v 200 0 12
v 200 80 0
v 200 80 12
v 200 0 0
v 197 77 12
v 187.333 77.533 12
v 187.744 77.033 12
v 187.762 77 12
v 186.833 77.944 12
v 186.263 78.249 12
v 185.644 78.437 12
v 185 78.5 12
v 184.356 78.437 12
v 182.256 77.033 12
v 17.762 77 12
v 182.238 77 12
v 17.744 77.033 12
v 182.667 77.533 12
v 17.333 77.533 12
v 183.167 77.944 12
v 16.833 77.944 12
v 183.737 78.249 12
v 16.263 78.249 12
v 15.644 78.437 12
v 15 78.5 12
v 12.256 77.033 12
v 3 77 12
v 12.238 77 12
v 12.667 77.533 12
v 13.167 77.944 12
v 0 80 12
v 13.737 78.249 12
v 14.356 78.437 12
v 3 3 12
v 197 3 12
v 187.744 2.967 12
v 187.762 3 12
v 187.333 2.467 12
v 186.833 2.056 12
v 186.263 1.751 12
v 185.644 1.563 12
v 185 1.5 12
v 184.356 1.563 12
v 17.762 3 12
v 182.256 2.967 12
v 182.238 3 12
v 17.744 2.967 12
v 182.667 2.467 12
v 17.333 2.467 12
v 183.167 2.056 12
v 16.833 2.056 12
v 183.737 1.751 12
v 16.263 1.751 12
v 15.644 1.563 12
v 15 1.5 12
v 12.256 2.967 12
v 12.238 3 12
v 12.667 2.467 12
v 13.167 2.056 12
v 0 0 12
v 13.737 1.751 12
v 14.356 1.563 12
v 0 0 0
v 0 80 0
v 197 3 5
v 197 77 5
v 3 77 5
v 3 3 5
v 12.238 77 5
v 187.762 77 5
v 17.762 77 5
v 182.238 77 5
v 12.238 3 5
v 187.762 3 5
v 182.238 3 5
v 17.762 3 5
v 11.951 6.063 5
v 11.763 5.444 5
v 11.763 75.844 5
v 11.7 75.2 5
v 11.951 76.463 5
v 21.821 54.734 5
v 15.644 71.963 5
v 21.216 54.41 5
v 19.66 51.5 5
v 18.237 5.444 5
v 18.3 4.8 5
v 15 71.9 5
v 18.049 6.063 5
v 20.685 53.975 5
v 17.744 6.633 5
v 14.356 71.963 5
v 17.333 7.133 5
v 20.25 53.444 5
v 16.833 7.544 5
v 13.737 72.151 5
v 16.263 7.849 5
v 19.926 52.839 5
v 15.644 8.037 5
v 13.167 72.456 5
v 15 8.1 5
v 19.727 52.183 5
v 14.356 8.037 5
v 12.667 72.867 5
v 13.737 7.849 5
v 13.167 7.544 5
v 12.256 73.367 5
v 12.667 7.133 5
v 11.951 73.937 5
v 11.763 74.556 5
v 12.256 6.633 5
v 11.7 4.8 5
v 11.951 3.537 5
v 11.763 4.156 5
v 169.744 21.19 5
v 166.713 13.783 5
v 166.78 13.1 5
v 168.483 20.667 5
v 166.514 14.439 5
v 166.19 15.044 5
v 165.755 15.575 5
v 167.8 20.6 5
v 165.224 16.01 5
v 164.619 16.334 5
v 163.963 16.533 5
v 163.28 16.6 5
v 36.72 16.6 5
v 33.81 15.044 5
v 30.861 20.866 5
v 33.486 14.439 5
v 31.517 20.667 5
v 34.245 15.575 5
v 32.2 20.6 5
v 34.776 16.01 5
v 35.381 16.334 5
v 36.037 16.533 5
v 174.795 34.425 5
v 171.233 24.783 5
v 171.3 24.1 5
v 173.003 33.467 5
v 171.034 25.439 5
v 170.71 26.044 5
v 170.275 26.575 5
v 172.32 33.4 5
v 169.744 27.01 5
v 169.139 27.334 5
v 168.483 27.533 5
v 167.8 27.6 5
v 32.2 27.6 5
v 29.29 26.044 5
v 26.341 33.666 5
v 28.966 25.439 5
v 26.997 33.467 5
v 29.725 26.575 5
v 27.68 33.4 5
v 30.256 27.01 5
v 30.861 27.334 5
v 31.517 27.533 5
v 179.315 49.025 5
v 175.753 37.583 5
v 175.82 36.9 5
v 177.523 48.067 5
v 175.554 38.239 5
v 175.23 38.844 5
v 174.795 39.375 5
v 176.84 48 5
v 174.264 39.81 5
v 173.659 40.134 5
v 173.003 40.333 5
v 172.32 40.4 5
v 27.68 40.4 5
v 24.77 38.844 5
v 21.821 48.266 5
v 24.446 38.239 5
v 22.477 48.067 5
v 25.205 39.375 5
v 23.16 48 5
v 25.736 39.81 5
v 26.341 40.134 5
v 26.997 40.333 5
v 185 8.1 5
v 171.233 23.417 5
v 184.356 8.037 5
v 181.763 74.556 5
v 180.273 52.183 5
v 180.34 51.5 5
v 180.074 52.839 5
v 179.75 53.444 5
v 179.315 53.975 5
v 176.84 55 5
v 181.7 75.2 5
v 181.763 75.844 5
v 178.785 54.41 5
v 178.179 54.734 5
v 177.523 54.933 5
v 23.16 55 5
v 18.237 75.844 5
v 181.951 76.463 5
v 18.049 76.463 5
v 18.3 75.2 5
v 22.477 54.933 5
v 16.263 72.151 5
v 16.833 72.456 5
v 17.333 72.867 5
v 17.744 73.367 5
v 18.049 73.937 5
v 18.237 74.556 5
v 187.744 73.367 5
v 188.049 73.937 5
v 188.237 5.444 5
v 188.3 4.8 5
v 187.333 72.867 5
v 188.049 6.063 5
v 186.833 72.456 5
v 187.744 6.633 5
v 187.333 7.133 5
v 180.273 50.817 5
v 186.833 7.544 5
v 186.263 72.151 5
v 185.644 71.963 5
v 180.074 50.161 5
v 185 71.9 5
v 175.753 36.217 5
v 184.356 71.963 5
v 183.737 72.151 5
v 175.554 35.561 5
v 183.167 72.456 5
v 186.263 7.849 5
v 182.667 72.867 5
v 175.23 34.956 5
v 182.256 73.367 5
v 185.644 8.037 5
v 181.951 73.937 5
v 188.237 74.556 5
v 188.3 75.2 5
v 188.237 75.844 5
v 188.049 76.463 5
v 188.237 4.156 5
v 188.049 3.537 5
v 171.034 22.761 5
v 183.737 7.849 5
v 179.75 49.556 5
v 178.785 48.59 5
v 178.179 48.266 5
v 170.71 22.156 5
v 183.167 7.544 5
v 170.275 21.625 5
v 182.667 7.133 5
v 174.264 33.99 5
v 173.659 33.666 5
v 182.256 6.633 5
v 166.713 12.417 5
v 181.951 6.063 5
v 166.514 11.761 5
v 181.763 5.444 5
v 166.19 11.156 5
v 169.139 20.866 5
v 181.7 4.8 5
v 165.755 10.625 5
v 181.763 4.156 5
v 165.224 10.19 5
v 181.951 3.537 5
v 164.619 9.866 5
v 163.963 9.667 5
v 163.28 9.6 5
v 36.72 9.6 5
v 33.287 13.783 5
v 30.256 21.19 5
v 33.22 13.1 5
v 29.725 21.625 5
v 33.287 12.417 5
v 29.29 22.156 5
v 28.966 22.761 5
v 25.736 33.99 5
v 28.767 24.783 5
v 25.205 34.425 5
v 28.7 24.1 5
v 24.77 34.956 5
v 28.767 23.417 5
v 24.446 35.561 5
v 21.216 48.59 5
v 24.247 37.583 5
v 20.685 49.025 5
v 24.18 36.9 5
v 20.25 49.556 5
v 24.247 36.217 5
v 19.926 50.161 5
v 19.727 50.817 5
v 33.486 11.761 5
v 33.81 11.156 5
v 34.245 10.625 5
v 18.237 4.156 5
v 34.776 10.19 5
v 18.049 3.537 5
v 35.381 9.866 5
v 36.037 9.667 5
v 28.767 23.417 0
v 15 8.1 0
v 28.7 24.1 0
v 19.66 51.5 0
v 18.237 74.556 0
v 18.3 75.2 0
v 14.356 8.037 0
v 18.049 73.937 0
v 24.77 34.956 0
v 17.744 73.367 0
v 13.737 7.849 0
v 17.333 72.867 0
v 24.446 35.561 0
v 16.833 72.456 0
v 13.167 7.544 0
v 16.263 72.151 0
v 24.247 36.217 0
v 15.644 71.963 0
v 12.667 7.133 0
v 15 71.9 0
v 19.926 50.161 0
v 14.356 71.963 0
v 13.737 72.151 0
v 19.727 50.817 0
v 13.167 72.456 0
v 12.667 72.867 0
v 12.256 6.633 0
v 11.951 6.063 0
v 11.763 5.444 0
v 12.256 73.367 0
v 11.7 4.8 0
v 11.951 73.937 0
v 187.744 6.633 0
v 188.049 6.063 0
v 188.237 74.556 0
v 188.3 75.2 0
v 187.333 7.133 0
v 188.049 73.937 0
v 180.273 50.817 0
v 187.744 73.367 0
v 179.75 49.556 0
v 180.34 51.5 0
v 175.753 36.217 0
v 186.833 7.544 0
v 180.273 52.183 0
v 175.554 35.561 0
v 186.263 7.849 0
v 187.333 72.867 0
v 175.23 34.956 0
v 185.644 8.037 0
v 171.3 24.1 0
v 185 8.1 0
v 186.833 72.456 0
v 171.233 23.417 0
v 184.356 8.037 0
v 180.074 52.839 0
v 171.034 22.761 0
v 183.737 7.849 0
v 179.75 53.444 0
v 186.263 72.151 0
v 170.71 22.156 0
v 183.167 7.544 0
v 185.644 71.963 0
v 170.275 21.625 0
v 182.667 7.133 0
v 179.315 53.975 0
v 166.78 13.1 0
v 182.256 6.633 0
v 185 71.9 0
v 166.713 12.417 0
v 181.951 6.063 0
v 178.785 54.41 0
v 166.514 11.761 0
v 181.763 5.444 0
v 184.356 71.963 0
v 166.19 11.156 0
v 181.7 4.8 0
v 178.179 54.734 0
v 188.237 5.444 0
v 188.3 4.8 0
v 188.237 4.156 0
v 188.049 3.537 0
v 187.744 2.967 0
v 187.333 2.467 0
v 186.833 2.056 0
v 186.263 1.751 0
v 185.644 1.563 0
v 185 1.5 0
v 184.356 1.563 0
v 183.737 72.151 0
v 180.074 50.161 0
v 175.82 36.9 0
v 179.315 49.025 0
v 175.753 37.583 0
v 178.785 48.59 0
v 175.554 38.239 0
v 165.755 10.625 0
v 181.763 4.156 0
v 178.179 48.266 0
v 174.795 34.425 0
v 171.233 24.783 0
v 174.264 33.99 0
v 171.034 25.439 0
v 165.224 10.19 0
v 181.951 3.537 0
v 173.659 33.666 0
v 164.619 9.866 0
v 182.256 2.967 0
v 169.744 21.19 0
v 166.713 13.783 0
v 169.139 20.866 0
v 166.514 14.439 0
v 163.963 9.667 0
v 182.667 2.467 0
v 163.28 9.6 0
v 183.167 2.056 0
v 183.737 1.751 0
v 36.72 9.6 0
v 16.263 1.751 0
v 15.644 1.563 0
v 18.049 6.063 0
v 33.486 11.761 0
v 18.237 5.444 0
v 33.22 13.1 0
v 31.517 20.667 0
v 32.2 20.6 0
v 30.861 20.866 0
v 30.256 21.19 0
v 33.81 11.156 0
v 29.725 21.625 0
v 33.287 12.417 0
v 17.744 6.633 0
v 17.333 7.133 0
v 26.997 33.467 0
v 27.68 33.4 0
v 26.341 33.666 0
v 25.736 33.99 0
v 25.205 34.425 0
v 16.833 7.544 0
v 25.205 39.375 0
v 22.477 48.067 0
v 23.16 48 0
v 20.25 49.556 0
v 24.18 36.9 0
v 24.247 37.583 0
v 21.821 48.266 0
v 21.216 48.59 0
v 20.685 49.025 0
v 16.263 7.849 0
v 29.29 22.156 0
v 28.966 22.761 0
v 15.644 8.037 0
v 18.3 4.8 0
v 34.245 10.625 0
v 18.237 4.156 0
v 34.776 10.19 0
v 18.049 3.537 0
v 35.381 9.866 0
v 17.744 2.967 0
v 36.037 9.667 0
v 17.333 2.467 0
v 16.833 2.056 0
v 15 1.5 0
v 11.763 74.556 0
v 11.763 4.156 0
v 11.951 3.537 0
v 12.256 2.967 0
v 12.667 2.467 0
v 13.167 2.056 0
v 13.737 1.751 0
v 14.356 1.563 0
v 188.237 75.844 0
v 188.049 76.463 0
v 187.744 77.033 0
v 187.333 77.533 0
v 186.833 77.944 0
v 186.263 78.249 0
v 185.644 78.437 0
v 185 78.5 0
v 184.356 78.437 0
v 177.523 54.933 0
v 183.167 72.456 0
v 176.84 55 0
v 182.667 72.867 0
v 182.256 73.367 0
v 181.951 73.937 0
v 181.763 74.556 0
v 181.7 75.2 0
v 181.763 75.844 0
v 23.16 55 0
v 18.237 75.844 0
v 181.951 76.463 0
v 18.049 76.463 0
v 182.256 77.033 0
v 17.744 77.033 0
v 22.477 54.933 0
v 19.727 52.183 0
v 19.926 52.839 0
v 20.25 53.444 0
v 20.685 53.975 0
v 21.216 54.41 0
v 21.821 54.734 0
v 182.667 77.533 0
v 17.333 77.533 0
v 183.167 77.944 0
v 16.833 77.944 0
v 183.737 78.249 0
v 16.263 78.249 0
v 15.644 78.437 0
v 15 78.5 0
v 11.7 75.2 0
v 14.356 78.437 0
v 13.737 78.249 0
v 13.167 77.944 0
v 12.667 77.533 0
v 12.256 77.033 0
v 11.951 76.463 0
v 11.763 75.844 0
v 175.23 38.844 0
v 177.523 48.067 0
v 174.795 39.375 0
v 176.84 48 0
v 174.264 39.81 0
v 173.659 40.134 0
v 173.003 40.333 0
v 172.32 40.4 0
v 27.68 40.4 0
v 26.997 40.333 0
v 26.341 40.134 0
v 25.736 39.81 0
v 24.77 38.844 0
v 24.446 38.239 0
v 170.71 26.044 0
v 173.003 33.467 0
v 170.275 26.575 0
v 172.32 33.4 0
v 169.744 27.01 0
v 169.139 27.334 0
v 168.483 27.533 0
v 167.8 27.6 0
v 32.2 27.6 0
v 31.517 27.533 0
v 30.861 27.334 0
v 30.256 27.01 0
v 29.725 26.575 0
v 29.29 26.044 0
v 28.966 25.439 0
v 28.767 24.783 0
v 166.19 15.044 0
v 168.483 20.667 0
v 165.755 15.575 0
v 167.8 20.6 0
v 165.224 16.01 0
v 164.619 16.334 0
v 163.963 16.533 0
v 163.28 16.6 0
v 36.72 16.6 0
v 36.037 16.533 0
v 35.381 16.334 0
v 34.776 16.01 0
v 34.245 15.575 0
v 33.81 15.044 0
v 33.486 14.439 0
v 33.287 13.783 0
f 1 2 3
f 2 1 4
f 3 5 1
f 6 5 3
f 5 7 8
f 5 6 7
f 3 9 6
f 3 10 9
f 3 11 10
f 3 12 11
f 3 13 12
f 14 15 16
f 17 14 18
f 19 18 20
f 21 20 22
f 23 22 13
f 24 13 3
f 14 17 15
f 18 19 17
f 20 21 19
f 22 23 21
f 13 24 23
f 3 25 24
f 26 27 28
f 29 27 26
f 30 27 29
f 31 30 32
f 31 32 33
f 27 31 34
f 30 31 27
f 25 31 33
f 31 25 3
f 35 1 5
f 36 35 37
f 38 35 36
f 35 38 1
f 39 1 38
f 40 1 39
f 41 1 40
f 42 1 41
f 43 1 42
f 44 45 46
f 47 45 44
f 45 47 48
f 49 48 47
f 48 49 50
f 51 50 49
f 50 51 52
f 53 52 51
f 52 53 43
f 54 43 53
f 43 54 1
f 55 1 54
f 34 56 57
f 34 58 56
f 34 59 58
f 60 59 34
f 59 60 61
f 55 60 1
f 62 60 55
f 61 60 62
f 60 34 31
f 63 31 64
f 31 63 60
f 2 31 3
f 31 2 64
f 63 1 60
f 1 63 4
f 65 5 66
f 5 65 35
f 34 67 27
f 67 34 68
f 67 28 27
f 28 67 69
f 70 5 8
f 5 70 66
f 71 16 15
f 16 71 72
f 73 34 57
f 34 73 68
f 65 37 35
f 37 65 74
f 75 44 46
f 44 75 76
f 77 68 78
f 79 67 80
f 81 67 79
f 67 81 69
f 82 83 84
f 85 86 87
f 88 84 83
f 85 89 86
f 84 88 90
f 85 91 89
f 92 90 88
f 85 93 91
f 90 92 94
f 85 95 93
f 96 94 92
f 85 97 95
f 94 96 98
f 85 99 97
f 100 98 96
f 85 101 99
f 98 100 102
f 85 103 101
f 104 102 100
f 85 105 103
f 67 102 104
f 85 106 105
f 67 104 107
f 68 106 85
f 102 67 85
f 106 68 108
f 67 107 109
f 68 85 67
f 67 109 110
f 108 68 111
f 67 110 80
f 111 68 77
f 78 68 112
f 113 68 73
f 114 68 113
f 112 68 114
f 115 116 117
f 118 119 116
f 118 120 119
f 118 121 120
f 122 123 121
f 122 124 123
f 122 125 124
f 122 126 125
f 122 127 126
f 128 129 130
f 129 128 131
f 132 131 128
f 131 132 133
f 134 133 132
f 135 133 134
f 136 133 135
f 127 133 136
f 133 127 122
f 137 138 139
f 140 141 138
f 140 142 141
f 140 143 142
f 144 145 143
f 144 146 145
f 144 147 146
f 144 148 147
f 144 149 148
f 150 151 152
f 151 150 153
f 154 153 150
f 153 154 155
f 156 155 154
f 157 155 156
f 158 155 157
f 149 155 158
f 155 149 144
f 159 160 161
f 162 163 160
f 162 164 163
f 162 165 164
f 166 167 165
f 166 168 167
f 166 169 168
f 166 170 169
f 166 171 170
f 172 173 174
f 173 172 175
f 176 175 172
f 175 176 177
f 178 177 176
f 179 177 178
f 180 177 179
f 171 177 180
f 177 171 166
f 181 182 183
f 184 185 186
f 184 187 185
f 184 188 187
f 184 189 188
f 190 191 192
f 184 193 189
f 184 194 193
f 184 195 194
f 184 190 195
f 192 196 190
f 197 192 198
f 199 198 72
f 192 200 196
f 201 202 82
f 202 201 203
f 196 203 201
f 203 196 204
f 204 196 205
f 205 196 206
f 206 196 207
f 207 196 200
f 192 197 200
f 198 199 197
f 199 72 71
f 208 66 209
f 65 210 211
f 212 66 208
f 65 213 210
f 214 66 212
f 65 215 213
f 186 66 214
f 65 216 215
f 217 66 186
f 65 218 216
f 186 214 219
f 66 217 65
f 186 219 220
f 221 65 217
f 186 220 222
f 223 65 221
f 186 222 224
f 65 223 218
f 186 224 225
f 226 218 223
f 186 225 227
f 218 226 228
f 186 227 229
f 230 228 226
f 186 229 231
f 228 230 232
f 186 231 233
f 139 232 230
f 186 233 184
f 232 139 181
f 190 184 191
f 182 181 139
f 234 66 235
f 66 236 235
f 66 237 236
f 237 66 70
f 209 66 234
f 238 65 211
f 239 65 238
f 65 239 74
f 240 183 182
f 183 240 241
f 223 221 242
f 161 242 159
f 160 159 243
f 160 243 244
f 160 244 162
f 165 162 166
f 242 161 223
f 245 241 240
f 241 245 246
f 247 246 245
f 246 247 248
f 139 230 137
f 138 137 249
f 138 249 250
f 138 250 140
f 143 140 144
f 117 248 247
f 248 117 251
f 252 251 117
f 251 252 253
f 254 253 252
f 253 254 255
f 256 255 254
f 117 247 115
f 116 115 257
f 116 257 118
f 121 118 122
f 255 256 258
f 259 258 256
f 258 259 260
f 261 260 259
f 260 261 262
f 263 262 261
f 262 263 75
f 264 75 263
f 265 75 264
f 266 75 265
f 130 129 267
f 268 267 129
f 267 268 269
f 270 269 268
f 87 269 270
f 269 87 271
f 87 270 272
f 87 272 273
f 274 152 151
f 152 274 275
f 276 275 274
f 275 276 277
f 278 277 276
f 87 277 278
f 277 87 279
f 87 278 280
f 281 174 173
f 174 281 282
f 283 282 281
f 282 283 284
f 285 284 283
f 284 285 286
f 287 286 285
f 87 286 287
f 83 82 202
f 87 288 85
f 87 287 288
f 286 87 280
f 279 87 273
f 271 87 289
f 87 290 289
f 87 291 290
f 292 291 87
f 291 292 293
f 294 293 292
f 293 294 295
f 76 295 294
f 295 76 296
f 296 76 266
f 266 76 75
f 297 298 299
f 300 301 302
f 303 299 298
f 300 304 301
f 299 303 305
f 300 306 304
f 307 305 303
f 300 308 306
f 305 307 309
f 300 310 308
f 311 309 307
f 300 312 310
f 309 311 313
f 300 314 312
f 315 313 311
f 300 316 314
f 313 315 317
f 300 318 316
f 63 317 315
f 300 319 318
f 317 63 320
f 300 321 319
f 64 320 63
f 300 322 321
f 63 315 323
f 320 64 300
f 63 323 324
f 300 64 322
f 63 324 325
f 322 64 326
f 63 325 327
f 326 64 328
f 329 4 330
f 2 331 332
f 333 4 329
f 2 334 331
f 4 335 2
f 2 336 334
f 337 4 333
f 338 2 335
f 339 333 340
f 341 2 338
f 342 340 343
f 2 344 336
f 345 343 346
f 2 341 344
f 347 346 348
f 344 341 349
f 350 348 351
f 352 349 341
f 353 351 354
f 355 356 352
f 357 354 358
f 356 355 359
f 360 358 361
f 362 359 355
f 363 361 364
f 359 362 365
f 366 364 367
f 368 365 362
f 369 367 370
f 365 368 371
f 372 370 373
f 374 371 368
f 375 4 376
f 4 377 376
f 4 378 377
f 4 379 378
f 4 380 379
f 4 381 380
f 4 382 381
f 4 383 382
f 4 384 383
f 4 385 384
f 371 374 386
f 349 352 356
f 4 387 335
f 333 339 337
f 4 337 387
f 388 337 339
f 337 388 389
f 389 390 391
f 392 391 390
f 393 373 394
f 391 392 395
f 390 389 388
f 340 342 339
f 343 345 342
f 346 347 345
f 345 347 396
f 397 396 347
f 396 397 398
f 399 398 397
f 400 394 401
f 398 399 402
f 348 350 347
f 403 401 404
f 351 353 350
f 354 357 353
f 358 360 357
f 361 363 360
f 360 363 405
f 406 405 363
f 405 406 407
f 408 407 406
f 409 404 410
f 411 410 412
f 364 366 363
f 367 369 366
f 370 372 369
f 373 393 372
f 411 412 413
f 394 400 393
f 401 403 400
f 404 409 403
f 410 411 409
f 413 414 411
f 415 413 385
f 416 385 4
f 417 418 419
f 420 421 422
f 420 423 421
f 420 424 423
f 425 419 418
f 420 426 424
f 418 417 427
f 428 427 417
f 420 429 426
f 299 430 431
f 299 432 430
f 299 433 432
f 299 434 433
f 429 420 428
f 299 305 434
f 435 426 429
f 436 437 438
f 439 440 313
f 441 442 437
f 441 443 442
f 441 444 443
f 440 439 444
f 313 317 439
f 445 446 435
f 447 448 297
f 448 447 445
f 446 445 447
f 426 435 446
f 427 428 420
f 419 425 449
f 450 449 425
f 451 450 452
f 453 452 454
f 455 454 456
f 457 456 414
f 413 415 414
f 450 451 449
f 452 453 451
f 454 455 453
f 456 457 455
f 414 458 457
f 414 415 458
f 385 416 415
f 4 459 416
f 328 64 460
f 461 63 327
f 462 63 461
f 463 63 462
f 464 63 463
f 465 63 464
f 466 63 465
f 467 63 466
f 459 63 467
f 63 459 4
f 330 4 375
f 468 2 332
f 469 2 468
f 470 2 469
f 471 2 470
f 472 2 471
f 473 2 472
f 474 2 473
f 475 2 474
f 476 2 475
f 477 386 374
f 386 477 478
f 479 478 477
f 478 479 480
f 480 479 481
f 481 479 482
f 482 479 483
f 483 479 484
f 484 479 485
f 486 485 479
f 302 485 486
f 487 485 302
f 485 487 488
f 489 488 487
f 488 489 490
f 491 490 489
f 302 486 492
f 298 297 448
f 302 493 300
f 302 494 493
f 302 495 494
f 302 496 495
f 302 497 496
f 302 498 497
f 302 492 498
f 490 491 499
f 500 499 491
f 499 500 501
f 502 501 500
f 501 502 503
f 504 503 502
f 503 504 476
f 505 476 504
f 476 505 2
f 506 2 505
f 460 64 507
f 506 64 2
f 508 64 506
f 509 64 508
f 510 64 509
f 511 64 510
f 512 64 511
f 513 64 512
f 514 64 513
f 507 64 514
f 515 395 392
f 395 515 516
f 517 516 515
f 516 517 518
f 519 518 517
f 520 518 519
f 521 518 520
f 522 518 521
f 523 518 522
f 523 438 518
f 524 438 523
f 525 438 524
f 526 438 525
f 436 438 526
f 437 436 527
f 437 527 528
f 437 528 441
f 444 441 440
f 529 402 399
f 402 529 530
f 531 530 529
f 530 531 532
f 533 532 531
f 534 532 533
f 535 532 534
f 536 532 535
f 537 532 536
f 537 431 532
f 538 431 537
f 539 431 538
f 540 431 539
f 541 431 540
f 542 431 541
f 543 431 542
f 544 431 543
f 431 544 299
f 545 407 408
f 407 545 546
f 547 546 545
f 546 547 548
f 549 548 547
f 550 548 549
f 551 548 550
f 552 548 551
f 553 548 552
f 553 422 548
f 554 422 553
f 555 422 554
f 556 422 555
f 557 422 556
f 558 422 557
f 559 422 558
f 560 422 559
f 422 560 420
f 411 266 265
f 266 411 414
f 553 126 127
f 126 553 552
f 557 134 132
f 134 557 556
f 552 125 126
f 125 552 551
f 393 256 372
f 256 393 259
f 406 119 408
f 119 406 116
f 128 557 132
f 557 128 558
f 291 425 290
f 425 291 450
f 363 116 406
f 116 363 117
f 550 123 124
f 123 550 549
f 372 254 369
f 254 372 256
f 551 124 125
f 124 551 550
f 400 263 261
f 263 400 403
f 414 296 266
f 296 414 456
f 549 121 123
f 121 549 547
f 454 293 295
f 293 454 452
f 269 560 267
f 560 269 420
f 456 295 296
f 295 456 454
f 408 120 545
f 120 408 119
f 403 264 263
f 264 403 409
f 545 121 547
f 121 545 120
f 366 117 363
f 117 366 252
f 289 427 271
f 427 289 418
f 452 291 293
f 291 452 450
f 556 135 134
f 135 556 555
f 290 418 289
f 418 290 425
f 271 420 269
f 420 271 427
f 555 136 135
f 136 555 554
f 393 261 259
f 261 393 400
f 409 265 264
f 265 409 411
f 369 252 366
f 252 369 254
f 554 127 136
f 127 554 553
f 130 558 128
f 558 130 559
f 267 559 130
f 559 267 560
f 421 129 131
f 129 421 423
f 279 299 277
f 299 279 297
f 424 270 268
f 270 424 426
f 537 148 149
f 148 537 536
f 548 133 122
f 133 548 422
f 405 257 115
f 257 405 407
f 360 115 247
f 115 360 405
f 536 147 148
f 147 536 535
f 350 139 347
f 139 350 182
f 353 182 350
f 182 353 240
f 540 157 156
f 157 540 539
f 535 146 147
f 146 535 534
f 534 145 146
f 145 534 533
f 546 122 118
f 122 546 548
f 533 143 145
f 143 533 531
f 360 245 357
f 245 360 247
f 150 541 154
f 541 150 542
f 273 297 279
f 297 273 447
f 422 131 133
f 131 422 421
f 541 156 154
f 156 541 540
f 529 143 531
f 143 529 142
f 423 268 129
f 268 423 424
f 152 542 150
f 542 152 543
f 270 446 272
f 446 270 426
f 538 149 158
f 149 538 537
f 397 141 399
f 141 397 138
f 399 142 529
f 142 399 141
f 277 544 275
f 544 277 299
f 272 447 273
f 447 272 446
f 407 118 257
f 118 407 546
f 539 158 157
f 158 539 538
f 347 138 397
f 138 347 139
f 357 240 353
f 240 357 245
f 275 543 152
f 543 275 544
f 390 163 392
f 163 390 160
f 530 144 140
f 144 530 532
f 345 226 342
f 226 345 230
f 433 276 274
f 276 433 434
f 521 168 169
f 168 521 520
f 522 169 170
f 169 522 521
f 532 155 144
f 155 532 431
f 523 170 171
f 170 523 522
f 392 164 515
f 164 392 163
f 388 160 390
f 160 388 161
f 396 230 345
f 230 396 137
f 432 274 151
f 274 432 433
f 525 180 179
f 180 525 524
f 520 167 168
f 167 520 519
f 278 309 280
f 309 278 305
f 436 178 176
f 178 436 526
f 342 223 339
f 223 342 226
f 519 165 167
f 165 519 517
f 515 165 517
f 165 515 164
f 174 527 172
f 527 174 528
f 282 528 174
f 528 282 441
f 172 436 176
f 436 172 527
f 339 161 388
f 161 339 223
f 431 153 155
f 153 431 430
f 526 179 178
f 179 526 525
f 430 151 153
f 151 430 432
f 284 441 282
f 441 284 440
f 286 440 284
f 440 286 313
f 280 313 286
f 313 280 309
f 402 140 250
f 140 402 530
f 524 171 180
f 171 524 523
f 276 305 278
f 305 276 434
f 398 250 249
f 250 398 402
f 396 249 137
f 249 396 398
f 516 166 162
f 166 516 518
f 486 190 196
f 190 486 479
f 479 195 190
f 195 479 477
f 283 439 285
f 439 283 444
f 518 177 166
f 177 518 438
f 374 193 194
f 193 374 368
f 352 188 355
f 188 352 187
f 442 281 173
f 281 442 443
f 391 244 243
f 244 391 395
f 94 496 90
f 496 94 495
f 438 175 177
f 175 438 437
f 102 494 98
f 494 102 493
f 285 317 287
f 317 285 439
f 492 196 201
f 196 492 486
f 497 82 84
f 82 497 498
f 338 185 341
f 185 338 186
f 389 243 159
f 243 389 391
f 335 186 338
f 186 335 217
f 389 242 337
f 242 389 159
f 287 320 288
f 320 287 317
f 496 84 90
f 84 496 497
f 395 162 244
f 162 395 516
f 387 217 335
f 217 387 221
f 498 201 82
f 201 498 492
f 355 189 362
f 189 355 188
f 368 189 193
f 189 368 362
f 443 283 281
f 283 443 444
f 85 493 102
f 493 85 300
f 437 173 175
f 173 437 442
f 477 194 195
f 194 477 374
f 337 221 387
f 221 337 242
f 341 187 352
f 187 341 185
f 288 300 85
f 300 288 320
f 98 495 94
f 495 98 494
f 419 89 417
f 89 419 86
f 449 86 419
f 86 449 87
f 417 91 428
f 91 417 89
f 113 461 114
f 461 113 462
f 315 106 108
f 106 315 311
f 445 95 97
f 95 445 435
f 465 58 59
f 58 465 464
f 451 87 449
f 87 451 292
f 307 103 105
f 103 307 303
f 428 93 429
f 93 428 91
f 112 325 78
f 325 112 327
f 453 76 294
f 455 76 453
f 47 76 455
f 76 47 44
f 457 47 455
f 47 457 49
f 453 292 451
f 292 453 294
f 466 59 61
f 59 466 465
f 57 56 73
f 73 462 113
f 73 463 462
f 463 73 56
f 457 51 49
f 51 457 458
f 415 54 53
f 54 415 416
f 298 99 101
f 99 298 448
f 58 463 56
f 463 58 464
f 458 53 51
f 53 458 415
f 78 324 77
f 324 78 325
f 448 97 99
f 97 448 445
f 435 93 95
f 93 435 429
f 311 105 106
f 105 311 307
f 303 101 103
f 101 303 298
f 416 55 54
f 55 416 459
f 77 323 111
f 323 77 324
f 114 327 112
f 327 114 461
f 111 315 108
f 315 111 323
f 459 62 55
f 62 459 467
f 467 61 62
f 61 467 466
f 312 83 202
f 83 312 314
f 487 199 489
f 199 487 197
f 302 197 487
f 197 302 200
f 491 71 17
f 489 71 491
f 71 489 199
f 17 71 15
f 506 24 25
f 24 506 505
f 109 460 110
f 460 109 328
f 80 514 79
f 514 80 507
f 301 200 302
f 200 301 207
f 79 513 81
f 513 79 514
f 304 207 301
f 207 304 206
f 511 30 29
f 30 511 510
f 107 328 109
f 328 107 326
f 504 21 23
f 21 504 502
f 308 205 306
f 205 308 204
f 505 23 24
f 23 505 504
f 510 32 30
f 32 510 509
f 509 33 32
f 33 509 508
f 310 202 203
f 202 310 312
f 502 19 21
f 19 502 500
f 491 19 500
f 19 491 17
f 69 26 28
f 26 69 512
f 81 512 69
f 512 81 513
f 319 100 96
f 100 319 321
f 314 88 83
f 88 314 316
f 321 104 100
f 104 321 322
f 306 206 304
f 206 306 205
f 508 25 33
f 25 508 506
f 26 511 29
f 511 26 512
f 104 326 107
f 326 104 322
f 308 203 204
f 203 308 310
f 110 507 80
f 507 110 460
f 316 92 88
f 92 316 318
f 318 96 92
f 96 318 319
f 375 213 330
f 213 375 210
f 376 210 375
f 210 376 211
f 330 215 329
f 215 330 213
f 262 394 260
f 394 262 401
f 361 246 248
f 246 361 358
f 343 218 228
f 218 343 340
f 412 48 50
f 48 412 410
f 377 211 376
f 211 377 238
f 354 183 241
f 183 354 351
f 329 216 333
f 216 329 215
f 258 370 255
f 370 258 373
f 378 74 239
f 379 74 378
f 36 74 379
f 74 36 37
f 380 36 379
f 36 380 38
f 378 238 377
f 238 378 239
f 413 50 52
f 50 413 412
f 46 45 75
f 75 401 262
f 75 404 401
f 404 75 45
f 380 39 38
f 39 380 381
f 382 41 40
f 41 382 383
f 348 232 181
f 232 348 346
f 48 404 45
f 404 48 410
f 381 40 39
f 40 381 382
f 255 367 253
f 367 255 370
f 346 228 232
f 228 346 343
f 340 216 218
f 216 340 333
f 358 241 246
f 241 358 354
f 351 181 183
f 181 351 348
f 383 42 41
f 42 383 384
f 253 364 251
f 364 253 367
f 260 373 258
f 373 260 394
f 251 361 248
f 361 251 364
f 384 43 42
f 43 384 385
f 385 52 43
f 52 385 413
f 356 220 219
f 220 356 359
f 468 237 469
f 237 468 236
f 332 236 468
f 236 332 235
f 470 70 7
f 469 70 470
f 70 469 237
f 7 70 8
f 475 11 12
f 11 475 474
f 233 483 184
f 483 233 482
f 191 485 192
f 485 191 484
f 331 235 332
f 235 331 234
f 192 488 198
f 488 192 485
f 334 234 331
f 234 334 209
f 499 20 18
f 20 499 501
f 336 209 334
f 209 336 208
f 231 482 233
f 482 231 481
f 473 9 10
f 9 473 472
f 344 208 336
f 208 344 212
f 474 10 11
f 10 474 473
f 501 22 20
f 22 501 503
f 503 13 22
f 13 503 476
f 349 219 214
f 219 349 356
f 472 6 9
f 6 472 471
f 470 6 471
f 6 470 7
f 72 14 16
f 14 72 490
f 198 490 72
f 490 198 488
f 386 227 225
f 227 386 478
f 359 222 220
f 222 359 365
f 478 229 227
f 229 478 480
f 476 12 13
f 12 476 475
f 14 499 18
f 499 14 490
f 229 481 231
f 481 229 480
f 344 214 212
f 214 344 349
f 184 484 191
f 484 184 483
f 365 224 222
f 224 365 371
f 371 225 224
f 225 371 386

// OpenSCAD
$fn = 32;

// ----------------------------------------------------------------------
// Slotted panel: 200 x 80 mm, 4 ряда of slots
// ----------------------------------------------------------------------

// --- parameters (mm) ---
panel_w = 200;            // panel width
panel_d = 80;             // panel depth
thick = 5;                // panel thickness
slot_w = 7;               // slot width
pitch0 = 11;              // first row pitch
pitch_step = 1.8;         // pitch increase per row
margin = 9.6;             // margin around the slot field
rows = 4;                 // number of slot rows
mount_d = 6.6;            // mounting holes
mount_x = 85;             // mounting hole offset
rim_h = 12;               // rim height
rim_t = 3;                // rim wall thickness

difference() {
  union() {
    cube([panel_w, panel_d, thick]);
    translate([0, 0, thick - 1]) difference() {
      cube([panel_w, panel_d, rim_h - thick + 1]);
      translate([rim_t, rim_t, -2.5]) cube([panel_w - 2 * rim_t, panel_d - 2 * rim_t, rim_h - thick + 6]);
    }
  }
  /* slot rows: stadium shaped cutters, 2.5 mm clear of both faces */
  /* row 0: pitch 11, length 126.56 */
  hull() {
    translate([36.72, 13.1, -2.5]) cylinder(h = thick + 5, d = slot_w);
    translate([163.28, 13.1, -2.5]) cylinder(h = thick + 5, d = slot_w);
  }
  /* row 1: pitch 12.8, length 135.6 */
  hull() {
    translate([32.2, 24.1, -2.5]) cylinder(h = thick + 5, d = slot_w);
    translate([167.8, 24.1, -2.5]) cylinder(h = thick + 5, d = slot_w);
  }
  /* row 2: pitch 14.6, length 144.64 */
  hull() {
    translate([27.68, 36.9, -2.5]) cylinder(h = thick + 5, d = slot_w);
    translate([172.32, 36.9, -2.5]) cylinder(h = thick + 5, d = slot_w);
  }
  /* row 3: pitch 16.4, length 153.68 */
  hull() {
    translate([23.16, 51.5, -2.5]) cylinder(h = thick + 5, d = slot_w);
    translate([176.84, 51.5, -2.5]) cylinder(h = thick + 5, d = slot_w);
  }
  translate([15, 4.8, -2.5]) cylinder(h = 17, d = mount_d);
  translate([15, 75.2, -2.5]) cylinder(h = 17, d = mount_d);
  translate([185, 4.8, -2.5]) cylinder(h = 17, d = mount_d);
  translate([185, 75.2, -2.5]) cylinder(h = 17, d = mount_d);
}
